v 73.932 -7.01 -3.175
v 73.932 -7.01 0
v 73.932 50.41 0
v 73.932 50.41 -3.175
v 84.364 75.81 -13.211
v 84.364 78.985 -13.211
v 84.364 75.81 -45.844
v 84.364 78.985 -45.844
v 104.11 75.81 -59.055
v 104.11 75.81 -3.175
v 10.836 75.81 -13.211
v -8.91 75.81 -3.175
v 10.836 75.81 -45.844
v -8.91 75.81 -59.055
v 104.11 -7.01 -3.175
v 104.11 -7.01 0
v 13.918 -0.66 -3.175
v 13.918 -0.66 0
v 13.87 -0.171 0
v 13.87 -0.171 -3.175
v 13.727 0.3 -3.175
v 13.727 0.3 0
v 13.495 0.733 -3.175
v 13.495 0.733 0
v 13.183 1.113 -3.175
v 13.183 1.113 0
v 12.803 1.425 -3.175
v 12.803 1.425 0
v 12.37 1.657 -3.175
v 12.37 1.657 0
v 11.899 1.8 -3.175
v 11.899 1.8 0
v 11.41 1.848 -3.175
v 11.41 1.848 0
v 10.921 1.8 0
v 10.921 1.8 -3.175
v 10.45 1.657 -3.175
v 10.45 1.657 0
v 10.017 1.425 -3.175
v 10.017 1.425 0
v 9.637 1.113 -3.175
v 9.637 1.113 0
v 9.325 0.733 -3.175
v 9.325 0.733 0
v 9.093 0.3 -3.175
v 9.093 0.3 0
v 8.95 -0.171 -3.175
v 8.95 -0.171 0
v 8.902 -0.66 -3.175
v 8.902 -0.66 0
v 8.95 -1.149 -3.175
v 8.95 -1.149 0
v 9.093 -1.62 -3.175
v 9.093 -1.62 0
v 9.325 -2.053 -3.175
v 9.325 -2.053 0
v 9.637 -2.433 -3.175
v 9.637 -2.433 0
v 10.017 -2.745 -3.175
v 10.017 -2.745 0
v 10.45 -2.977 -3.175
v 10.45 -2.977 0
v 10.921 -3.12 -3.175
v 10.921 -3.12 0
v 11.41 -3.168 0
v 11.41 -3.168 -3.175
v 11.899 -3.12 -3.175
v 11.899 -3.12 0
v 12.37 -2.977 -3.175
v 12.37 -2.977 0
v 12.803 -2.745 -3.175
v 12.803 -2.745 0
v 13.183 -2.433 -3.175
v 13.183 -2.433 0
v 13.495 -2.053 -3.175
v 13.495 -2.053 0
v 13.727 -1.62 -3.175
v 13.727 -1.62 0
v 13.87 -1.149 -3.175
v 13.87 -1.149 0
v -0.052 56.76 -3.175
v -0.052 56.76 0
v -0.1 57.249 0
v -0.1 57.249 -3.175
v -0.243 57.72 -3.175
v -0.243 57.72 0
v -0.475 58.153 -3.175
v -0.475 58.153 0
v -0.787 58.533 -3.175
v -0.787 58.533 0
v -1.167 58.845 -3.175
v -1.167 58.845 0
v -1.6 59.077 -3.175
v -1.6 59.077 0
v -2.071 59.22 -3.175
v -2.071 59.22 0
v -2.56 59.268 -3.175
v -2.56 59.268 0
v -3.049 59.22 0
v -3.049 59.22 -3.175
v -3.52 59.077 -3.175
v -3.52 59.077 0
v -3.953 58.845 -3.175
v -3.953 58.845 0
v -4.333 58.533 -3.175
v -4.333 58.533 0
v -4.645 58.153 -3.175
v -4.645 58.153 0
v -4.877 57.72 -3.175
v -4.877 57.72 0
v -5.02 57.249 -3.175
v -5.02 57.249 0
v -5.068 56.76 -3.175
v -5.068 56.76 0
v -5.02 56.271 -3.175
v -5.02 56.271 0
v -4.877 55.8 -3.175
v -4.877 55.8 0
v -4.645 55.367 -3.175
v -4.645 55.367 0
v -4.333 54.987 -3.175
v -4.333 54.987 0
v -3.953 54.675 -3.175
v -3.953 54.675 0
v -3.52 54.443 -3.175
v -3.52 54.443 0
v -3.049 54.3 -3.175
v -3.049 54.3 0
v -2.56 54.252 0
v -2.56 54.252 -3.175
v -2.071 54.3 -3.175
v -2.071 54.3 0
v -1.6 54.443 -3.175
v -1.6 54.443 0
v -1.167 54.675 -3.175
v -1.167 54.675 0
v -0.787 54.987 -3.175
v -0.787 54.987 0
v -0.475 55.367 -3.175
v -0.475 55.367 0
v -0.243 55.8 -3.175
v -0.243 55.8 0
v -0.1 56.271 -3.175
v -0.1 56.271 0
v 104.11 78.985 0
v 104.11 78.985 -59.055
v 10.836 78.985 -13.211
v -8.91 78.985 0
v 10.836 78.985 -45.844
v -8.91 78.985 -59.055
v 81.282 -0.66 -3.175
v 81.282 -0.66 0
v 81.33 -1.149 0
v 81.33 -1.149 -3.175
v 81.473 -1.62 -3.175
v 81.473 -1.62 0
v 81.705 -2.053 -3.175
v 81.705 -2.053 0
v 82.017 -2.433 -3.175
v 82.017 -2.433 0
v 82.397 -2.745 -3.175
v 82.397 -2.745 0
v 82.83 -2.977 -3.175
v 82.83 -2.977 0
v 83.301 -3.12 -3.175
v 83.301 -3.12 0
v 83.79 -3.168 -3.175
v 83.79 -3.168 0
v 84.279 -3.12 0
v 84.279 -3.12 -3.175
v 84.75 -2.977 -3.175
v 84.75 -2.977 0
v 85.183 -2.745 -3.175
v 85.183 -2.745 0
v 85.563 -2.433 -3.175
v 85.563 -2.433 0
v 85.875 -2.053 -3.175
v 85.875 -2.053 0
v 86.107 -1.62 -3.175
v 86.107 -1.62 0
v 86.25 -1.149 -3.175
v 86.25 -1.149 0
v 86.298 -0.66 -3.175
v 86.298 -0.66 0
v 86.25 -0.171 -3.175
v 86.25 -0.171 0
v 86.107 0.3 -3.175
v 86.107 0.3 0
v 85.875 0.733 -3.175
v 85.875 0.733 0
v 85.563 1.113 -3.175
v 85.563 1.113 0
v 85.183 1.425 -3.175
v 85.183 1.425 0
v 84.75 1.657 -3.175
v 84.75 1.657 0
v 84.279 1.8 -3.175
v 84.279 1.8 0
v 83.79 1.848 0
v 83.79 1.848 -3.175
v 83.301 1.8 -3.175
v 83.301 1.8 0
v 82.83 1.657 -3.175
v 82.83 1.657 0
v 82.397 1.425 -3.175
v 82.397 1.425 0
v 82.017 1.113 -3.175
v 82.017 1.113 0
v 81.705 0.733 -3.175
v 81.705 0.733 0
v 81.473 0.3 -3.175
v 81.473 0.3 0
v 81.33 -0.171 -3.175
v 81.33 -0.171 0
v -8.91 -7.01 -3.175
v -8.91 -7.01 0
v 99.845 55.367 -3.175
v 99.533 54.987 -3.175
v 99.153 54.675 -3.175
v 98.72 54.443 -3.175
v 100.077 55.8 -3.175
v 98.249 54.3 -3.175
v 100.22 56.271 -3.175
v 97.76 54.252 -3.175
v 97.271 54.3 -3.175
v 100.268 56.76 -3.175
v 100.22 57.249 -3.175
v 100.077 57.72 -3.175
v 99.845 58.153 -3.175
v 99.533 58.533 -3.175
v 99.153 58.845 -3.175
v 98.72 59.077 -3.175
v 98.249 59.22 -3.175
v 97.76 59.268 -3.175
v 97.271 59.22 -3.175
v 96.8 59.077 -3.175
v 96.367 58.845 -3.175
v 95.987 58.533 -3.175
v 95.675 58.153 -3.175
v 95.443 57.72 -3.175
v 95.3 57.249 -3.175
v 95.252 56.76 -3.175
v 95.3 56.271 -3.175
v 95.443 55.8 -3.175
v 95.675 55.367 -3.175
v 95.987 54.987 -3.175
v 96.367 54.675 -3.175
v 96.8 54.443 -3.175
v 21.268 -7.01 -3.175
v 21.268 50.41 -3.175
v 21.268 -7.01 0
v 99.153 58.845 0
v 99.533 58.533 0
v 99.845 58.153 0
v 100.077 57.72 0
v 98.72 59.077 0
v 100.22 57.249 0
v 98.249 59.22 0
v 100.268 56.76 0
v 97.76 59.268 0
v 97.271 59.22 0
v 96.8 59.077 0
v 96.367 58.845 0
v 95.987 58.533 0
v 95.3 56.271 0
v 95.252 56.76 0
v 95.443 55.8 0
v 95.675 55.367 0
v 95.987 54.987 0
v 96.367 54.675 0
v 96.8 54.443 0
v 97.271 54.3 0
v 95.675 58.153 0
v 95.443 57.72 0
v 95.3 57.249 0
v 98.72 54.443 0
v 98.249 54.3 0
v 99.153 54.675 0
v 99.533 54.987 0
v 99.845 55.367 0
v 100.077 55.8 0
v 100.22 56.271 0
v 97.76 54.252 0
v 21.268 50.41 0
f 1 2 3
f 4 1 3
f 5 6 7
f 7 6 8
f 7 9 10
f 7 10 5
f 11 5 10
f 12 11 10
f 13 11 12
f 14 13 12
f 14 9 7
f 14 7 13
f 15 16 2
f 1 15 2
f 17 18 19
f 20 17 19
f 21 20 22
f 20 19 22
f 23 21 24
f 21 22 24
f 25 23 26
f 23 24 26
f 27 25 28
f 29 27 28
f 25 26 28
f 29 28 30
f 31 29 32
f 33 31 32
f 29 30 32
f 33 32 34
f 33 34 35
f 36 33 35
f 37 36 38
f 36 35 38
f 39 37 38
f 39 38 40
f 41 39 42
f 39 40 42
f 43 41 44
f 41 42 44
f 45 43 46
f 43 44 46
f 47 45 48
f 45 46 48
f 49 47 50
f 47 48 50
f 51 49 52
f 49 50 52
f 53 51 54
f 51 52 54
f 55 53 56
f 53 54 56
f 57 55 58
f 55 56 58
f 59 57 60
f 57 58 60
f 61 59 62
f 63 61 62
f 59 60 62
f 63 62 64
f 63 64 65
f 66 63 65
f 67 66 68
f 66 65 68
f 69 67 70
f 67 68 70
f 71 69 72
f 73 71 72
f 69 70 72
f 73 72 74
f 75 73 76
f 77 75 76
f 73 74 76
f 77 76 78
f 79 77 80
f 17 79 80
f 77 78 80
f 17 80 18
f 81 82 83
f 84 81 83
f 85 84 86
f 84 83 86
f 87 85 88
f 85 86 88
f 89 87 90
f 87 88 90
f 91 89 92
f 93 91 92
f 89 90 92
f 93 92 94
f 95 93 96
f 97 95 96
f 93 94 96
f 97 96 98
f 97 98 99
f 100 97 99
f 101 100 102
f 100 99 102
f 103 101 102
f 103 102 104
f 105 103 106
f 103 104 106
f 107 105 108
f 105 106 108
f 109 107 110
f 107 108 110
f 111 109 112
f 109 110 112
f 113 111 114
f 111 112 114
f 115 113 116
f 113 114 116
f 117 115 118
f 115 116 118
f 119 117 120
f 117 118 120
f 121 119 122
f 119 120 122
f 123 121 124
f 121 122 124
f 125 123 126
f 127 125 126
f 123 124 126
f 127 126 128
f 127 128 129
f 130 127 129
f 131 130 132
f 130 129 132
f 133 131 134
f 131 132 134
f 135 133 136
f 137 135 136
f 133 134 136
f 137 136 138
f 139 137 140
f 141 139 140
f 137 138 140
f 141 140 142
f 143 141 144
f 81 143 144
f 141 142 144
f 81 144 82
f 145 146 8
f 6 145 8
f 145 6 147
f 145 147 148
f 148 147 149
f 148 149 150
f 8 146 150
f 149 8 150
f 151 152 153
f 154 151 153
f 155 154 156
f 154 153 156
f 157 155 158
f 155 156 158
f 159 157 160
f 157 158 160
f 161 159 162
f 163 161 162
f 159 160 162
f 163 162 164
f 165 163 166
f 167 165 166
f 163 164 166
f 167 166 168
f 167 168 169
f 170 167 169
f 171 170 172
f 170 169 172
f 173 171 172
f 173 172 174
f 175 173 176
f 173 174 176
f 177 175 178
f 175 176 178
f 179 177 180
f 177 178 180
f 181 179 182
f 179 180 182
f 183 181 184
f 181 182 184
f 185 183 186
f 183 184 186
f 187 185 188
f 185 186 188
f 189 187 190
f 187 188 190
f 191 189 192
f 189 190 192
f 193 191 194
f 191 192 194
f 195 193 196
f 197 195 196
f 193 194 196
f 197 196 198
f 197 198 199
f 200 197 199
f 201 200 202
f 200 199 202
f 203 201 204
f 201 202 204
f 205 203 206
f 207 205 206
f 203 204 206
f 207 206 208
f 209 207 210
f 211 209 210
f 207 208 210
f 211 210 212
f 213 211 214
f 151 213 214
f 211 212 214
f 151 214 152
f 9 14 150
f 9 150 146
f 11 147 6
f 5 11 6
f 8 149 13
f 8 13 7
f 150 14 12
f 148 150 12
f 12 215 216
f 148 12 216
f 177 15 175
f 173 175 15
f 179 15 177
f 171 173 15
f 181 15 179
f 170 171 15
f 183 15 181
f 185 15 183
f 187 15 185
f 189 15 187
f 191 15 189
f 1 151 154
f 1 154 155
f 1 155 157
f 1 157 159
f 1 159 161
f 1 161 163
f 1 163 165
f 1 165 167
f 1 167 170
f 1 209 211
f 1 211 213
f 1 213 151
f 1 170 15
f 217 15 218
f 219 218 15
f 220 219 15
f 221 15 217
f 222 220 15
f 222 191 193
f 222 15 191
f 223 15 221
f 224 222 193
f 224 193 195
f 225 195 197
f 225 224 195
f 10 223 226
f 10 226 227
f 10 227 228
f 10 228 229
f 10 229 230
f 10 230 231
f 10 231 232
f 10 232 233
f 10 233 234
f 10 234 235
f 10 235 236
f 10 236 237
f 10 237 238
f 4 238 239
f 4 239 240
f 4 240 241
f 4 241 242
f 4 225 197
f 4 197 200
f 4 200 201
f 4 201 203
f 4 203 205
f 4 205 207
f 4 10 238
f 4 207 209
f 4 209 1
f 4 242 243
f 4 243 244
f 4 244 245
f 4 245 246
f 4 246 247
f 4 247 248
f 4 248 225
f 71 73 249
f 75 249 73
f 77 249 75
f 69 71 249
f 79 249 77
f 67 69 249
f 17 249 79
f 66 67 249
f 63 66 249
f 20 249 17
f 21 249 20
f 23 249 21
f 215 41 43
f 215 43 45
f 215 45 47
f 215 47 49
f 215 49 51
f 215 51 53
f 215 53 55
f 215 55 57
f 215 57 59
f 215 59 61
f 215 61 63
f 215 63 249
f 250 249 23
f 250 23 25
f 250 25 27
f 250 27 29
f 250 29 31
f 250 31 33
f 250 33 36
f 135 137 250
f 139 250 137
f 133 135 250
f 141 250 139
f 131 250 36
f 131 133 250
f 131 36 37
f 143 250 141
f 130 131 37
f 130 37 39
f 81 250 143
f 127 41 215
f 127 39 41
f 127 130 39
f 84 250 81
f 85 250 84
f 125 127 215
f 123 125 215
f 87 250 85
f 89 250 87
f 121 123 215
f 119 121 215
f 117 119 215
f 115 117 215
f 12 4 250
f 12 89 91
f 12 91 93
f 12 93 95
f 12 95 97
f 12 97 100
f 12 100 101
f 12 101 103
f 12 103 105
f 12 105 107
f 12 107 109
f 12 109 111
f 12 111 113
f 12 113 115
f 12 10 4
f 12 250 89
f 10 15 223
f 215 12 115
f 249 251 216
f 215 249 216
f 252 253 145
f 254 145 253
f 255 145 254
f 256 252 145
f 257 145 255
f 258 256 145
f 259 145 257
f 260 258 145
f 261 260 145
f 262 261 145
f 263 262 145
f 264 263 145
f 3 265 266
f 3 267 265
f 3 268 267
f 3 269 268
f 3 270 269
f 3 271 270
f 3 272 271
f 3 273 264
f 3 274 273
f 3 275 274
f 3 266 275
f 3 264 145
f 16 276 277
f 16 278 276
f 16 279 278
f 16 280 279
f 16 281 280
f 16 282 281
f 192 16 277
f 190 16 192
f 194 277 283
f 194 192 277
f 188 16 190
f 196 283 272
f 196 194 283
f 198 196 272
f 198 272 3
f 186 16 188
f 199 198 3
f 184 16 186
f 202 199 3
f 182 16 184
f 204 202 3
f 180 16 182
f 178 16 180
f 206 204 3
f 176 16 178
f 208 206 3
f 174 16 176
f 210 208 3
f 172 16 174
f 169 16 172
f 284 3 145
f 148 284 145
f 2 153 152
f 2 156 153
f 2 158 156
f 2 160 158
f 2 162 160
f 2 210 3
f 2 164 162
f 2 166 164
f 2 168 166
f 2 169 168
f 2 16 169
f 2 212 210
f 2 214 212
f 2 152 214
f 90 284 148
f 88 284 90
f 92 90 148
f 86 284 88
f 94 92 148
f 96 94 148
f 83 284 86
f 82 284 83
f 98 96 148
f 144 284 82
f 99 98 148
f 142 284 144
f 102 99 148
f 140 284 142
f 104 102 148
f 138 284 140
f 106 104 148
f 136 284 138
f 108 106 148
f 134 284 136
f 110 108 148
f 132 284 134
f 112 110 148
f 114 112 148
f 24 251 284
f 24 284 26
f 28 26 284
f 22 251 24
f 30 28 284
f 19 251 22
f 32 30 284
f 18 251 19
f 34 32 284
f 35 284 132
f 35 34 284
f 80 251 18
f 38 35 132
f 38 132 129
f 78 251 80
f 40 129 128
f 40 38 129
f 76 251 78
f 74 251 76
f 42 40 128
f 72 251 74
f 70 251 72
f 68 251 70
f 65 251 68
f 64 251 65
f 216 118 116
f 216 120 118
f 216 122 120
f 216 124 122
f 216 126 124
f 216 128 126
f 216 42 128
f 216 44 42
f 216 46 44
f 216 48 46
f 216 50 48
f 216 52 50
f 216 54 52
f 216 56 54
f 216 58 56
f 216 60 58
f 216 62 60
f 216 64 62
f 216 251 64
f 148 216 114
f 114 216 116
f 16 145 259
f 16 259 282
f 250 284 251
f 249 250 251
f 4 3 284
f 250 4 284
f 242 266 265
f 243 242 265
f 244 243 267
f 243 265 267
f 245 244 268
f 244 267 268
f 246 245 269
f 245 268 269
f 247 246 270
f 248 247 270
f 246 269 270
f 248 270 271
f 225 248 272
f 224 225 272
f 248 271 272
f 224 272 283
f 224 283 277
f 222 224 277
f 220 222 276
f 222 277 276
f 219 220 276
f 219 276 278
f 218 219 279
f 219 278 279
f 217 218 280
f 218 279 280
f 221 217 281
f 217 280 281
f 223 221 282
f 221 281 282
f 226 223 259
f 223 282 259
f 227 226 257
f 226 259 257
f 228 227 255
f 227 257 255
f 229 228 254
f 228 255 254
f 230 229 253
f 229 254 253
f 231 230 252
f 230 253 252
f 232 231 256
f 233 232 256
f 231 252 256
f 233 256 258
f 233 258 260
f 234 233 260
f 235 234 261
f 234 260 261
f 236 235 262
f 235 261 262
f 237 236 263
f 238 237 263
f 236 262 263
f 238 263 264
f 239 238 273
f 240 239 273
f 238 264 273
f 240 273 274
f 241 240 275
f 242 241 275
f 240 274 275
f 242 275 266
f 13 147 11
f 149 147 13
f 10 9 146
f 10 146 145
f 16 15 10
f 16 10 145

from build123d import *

# Parameters (mm, degrees)
SKETCH1_R           = 2.508000064
BASE_FLANGE1_DEPTH  = 3.175
BOSS_EXTRUDE1_DEPTH = 3.175
SKETCH10_W          = 73.528573301
SKETCH10_H          = 32.63252049
CUT_EXTRUDE1_DEPTH  = 148.382240559


# Sheet-metal steps are written as plain solids
with BuildPart() as part:
    # Sketch1 → Base-Flange1 (new body)
    with BuildSketch(Plane.XY):
        Polygon((-8.910000095, 75.81), (21.268467492, 75.81), (73.931530887, 75.81), (104.109998474, 75.81), (104.109998474, -7.01), (73.931530887, -7.01), (73.931530887, 50.41), (21.268467492, 50.41), (21.268467492, -7.01), (-8.910000095, -7.01), align=None)
        with Locations((-2.560000095, 56.76)):
            Circle(SKETCH1_R, mode=Mode.SUBTRACT)
        with Locations((11.409999905, -0.66)):
            Circle(SKETCH1_R, mode=Mode.SUBTRACT)
        with Locations(Location((83.789998474, -0.66, 0), (0, 0, 180))):
            Circle(SKETCH1_R, mode=Mode.SUBTRACT)
        with Locations(Location((97.759998474, 56.76, 0), (0, 0, 180))):
            Circle(SKETCH1_R, mode=Mode.SUBTRACT)
    extrude(amount=-BASE_FLANGE1_DEPTH)

    # Sketch9 → Boss-Extrude1 (add)
    with BuildSketch(Plane(origin=(0, 75.81, 0), x_dir=(1, 0, 0), z_dir=(0, 1, 0))):
        Polygon((-8.910000095, 3.175), (-8.910000095, 59.055), (104.109998474, 59.055), (104.109998474, 0), (-8.910000095, 0), align=None)
    extrude(amount=BOSS_EXTRUDE1_DEPTH)

    # Sketch10 → Cut-Extrude1 (cut, through all)
    with BuildSketch(Plane(origin=(0, 78.985, 0), x_dir=(1, 0, 0), z_dir=(0, 1, 0))):
        with Locations((47.59999919, 29.5275)):
            Rectangle(SKETCH10_W, SKETCH10_H)
    extrude(amount=-CUT_EXTRUDE1_DEPTH, mode=Mode.SUBTRACT)


solid = part.part
